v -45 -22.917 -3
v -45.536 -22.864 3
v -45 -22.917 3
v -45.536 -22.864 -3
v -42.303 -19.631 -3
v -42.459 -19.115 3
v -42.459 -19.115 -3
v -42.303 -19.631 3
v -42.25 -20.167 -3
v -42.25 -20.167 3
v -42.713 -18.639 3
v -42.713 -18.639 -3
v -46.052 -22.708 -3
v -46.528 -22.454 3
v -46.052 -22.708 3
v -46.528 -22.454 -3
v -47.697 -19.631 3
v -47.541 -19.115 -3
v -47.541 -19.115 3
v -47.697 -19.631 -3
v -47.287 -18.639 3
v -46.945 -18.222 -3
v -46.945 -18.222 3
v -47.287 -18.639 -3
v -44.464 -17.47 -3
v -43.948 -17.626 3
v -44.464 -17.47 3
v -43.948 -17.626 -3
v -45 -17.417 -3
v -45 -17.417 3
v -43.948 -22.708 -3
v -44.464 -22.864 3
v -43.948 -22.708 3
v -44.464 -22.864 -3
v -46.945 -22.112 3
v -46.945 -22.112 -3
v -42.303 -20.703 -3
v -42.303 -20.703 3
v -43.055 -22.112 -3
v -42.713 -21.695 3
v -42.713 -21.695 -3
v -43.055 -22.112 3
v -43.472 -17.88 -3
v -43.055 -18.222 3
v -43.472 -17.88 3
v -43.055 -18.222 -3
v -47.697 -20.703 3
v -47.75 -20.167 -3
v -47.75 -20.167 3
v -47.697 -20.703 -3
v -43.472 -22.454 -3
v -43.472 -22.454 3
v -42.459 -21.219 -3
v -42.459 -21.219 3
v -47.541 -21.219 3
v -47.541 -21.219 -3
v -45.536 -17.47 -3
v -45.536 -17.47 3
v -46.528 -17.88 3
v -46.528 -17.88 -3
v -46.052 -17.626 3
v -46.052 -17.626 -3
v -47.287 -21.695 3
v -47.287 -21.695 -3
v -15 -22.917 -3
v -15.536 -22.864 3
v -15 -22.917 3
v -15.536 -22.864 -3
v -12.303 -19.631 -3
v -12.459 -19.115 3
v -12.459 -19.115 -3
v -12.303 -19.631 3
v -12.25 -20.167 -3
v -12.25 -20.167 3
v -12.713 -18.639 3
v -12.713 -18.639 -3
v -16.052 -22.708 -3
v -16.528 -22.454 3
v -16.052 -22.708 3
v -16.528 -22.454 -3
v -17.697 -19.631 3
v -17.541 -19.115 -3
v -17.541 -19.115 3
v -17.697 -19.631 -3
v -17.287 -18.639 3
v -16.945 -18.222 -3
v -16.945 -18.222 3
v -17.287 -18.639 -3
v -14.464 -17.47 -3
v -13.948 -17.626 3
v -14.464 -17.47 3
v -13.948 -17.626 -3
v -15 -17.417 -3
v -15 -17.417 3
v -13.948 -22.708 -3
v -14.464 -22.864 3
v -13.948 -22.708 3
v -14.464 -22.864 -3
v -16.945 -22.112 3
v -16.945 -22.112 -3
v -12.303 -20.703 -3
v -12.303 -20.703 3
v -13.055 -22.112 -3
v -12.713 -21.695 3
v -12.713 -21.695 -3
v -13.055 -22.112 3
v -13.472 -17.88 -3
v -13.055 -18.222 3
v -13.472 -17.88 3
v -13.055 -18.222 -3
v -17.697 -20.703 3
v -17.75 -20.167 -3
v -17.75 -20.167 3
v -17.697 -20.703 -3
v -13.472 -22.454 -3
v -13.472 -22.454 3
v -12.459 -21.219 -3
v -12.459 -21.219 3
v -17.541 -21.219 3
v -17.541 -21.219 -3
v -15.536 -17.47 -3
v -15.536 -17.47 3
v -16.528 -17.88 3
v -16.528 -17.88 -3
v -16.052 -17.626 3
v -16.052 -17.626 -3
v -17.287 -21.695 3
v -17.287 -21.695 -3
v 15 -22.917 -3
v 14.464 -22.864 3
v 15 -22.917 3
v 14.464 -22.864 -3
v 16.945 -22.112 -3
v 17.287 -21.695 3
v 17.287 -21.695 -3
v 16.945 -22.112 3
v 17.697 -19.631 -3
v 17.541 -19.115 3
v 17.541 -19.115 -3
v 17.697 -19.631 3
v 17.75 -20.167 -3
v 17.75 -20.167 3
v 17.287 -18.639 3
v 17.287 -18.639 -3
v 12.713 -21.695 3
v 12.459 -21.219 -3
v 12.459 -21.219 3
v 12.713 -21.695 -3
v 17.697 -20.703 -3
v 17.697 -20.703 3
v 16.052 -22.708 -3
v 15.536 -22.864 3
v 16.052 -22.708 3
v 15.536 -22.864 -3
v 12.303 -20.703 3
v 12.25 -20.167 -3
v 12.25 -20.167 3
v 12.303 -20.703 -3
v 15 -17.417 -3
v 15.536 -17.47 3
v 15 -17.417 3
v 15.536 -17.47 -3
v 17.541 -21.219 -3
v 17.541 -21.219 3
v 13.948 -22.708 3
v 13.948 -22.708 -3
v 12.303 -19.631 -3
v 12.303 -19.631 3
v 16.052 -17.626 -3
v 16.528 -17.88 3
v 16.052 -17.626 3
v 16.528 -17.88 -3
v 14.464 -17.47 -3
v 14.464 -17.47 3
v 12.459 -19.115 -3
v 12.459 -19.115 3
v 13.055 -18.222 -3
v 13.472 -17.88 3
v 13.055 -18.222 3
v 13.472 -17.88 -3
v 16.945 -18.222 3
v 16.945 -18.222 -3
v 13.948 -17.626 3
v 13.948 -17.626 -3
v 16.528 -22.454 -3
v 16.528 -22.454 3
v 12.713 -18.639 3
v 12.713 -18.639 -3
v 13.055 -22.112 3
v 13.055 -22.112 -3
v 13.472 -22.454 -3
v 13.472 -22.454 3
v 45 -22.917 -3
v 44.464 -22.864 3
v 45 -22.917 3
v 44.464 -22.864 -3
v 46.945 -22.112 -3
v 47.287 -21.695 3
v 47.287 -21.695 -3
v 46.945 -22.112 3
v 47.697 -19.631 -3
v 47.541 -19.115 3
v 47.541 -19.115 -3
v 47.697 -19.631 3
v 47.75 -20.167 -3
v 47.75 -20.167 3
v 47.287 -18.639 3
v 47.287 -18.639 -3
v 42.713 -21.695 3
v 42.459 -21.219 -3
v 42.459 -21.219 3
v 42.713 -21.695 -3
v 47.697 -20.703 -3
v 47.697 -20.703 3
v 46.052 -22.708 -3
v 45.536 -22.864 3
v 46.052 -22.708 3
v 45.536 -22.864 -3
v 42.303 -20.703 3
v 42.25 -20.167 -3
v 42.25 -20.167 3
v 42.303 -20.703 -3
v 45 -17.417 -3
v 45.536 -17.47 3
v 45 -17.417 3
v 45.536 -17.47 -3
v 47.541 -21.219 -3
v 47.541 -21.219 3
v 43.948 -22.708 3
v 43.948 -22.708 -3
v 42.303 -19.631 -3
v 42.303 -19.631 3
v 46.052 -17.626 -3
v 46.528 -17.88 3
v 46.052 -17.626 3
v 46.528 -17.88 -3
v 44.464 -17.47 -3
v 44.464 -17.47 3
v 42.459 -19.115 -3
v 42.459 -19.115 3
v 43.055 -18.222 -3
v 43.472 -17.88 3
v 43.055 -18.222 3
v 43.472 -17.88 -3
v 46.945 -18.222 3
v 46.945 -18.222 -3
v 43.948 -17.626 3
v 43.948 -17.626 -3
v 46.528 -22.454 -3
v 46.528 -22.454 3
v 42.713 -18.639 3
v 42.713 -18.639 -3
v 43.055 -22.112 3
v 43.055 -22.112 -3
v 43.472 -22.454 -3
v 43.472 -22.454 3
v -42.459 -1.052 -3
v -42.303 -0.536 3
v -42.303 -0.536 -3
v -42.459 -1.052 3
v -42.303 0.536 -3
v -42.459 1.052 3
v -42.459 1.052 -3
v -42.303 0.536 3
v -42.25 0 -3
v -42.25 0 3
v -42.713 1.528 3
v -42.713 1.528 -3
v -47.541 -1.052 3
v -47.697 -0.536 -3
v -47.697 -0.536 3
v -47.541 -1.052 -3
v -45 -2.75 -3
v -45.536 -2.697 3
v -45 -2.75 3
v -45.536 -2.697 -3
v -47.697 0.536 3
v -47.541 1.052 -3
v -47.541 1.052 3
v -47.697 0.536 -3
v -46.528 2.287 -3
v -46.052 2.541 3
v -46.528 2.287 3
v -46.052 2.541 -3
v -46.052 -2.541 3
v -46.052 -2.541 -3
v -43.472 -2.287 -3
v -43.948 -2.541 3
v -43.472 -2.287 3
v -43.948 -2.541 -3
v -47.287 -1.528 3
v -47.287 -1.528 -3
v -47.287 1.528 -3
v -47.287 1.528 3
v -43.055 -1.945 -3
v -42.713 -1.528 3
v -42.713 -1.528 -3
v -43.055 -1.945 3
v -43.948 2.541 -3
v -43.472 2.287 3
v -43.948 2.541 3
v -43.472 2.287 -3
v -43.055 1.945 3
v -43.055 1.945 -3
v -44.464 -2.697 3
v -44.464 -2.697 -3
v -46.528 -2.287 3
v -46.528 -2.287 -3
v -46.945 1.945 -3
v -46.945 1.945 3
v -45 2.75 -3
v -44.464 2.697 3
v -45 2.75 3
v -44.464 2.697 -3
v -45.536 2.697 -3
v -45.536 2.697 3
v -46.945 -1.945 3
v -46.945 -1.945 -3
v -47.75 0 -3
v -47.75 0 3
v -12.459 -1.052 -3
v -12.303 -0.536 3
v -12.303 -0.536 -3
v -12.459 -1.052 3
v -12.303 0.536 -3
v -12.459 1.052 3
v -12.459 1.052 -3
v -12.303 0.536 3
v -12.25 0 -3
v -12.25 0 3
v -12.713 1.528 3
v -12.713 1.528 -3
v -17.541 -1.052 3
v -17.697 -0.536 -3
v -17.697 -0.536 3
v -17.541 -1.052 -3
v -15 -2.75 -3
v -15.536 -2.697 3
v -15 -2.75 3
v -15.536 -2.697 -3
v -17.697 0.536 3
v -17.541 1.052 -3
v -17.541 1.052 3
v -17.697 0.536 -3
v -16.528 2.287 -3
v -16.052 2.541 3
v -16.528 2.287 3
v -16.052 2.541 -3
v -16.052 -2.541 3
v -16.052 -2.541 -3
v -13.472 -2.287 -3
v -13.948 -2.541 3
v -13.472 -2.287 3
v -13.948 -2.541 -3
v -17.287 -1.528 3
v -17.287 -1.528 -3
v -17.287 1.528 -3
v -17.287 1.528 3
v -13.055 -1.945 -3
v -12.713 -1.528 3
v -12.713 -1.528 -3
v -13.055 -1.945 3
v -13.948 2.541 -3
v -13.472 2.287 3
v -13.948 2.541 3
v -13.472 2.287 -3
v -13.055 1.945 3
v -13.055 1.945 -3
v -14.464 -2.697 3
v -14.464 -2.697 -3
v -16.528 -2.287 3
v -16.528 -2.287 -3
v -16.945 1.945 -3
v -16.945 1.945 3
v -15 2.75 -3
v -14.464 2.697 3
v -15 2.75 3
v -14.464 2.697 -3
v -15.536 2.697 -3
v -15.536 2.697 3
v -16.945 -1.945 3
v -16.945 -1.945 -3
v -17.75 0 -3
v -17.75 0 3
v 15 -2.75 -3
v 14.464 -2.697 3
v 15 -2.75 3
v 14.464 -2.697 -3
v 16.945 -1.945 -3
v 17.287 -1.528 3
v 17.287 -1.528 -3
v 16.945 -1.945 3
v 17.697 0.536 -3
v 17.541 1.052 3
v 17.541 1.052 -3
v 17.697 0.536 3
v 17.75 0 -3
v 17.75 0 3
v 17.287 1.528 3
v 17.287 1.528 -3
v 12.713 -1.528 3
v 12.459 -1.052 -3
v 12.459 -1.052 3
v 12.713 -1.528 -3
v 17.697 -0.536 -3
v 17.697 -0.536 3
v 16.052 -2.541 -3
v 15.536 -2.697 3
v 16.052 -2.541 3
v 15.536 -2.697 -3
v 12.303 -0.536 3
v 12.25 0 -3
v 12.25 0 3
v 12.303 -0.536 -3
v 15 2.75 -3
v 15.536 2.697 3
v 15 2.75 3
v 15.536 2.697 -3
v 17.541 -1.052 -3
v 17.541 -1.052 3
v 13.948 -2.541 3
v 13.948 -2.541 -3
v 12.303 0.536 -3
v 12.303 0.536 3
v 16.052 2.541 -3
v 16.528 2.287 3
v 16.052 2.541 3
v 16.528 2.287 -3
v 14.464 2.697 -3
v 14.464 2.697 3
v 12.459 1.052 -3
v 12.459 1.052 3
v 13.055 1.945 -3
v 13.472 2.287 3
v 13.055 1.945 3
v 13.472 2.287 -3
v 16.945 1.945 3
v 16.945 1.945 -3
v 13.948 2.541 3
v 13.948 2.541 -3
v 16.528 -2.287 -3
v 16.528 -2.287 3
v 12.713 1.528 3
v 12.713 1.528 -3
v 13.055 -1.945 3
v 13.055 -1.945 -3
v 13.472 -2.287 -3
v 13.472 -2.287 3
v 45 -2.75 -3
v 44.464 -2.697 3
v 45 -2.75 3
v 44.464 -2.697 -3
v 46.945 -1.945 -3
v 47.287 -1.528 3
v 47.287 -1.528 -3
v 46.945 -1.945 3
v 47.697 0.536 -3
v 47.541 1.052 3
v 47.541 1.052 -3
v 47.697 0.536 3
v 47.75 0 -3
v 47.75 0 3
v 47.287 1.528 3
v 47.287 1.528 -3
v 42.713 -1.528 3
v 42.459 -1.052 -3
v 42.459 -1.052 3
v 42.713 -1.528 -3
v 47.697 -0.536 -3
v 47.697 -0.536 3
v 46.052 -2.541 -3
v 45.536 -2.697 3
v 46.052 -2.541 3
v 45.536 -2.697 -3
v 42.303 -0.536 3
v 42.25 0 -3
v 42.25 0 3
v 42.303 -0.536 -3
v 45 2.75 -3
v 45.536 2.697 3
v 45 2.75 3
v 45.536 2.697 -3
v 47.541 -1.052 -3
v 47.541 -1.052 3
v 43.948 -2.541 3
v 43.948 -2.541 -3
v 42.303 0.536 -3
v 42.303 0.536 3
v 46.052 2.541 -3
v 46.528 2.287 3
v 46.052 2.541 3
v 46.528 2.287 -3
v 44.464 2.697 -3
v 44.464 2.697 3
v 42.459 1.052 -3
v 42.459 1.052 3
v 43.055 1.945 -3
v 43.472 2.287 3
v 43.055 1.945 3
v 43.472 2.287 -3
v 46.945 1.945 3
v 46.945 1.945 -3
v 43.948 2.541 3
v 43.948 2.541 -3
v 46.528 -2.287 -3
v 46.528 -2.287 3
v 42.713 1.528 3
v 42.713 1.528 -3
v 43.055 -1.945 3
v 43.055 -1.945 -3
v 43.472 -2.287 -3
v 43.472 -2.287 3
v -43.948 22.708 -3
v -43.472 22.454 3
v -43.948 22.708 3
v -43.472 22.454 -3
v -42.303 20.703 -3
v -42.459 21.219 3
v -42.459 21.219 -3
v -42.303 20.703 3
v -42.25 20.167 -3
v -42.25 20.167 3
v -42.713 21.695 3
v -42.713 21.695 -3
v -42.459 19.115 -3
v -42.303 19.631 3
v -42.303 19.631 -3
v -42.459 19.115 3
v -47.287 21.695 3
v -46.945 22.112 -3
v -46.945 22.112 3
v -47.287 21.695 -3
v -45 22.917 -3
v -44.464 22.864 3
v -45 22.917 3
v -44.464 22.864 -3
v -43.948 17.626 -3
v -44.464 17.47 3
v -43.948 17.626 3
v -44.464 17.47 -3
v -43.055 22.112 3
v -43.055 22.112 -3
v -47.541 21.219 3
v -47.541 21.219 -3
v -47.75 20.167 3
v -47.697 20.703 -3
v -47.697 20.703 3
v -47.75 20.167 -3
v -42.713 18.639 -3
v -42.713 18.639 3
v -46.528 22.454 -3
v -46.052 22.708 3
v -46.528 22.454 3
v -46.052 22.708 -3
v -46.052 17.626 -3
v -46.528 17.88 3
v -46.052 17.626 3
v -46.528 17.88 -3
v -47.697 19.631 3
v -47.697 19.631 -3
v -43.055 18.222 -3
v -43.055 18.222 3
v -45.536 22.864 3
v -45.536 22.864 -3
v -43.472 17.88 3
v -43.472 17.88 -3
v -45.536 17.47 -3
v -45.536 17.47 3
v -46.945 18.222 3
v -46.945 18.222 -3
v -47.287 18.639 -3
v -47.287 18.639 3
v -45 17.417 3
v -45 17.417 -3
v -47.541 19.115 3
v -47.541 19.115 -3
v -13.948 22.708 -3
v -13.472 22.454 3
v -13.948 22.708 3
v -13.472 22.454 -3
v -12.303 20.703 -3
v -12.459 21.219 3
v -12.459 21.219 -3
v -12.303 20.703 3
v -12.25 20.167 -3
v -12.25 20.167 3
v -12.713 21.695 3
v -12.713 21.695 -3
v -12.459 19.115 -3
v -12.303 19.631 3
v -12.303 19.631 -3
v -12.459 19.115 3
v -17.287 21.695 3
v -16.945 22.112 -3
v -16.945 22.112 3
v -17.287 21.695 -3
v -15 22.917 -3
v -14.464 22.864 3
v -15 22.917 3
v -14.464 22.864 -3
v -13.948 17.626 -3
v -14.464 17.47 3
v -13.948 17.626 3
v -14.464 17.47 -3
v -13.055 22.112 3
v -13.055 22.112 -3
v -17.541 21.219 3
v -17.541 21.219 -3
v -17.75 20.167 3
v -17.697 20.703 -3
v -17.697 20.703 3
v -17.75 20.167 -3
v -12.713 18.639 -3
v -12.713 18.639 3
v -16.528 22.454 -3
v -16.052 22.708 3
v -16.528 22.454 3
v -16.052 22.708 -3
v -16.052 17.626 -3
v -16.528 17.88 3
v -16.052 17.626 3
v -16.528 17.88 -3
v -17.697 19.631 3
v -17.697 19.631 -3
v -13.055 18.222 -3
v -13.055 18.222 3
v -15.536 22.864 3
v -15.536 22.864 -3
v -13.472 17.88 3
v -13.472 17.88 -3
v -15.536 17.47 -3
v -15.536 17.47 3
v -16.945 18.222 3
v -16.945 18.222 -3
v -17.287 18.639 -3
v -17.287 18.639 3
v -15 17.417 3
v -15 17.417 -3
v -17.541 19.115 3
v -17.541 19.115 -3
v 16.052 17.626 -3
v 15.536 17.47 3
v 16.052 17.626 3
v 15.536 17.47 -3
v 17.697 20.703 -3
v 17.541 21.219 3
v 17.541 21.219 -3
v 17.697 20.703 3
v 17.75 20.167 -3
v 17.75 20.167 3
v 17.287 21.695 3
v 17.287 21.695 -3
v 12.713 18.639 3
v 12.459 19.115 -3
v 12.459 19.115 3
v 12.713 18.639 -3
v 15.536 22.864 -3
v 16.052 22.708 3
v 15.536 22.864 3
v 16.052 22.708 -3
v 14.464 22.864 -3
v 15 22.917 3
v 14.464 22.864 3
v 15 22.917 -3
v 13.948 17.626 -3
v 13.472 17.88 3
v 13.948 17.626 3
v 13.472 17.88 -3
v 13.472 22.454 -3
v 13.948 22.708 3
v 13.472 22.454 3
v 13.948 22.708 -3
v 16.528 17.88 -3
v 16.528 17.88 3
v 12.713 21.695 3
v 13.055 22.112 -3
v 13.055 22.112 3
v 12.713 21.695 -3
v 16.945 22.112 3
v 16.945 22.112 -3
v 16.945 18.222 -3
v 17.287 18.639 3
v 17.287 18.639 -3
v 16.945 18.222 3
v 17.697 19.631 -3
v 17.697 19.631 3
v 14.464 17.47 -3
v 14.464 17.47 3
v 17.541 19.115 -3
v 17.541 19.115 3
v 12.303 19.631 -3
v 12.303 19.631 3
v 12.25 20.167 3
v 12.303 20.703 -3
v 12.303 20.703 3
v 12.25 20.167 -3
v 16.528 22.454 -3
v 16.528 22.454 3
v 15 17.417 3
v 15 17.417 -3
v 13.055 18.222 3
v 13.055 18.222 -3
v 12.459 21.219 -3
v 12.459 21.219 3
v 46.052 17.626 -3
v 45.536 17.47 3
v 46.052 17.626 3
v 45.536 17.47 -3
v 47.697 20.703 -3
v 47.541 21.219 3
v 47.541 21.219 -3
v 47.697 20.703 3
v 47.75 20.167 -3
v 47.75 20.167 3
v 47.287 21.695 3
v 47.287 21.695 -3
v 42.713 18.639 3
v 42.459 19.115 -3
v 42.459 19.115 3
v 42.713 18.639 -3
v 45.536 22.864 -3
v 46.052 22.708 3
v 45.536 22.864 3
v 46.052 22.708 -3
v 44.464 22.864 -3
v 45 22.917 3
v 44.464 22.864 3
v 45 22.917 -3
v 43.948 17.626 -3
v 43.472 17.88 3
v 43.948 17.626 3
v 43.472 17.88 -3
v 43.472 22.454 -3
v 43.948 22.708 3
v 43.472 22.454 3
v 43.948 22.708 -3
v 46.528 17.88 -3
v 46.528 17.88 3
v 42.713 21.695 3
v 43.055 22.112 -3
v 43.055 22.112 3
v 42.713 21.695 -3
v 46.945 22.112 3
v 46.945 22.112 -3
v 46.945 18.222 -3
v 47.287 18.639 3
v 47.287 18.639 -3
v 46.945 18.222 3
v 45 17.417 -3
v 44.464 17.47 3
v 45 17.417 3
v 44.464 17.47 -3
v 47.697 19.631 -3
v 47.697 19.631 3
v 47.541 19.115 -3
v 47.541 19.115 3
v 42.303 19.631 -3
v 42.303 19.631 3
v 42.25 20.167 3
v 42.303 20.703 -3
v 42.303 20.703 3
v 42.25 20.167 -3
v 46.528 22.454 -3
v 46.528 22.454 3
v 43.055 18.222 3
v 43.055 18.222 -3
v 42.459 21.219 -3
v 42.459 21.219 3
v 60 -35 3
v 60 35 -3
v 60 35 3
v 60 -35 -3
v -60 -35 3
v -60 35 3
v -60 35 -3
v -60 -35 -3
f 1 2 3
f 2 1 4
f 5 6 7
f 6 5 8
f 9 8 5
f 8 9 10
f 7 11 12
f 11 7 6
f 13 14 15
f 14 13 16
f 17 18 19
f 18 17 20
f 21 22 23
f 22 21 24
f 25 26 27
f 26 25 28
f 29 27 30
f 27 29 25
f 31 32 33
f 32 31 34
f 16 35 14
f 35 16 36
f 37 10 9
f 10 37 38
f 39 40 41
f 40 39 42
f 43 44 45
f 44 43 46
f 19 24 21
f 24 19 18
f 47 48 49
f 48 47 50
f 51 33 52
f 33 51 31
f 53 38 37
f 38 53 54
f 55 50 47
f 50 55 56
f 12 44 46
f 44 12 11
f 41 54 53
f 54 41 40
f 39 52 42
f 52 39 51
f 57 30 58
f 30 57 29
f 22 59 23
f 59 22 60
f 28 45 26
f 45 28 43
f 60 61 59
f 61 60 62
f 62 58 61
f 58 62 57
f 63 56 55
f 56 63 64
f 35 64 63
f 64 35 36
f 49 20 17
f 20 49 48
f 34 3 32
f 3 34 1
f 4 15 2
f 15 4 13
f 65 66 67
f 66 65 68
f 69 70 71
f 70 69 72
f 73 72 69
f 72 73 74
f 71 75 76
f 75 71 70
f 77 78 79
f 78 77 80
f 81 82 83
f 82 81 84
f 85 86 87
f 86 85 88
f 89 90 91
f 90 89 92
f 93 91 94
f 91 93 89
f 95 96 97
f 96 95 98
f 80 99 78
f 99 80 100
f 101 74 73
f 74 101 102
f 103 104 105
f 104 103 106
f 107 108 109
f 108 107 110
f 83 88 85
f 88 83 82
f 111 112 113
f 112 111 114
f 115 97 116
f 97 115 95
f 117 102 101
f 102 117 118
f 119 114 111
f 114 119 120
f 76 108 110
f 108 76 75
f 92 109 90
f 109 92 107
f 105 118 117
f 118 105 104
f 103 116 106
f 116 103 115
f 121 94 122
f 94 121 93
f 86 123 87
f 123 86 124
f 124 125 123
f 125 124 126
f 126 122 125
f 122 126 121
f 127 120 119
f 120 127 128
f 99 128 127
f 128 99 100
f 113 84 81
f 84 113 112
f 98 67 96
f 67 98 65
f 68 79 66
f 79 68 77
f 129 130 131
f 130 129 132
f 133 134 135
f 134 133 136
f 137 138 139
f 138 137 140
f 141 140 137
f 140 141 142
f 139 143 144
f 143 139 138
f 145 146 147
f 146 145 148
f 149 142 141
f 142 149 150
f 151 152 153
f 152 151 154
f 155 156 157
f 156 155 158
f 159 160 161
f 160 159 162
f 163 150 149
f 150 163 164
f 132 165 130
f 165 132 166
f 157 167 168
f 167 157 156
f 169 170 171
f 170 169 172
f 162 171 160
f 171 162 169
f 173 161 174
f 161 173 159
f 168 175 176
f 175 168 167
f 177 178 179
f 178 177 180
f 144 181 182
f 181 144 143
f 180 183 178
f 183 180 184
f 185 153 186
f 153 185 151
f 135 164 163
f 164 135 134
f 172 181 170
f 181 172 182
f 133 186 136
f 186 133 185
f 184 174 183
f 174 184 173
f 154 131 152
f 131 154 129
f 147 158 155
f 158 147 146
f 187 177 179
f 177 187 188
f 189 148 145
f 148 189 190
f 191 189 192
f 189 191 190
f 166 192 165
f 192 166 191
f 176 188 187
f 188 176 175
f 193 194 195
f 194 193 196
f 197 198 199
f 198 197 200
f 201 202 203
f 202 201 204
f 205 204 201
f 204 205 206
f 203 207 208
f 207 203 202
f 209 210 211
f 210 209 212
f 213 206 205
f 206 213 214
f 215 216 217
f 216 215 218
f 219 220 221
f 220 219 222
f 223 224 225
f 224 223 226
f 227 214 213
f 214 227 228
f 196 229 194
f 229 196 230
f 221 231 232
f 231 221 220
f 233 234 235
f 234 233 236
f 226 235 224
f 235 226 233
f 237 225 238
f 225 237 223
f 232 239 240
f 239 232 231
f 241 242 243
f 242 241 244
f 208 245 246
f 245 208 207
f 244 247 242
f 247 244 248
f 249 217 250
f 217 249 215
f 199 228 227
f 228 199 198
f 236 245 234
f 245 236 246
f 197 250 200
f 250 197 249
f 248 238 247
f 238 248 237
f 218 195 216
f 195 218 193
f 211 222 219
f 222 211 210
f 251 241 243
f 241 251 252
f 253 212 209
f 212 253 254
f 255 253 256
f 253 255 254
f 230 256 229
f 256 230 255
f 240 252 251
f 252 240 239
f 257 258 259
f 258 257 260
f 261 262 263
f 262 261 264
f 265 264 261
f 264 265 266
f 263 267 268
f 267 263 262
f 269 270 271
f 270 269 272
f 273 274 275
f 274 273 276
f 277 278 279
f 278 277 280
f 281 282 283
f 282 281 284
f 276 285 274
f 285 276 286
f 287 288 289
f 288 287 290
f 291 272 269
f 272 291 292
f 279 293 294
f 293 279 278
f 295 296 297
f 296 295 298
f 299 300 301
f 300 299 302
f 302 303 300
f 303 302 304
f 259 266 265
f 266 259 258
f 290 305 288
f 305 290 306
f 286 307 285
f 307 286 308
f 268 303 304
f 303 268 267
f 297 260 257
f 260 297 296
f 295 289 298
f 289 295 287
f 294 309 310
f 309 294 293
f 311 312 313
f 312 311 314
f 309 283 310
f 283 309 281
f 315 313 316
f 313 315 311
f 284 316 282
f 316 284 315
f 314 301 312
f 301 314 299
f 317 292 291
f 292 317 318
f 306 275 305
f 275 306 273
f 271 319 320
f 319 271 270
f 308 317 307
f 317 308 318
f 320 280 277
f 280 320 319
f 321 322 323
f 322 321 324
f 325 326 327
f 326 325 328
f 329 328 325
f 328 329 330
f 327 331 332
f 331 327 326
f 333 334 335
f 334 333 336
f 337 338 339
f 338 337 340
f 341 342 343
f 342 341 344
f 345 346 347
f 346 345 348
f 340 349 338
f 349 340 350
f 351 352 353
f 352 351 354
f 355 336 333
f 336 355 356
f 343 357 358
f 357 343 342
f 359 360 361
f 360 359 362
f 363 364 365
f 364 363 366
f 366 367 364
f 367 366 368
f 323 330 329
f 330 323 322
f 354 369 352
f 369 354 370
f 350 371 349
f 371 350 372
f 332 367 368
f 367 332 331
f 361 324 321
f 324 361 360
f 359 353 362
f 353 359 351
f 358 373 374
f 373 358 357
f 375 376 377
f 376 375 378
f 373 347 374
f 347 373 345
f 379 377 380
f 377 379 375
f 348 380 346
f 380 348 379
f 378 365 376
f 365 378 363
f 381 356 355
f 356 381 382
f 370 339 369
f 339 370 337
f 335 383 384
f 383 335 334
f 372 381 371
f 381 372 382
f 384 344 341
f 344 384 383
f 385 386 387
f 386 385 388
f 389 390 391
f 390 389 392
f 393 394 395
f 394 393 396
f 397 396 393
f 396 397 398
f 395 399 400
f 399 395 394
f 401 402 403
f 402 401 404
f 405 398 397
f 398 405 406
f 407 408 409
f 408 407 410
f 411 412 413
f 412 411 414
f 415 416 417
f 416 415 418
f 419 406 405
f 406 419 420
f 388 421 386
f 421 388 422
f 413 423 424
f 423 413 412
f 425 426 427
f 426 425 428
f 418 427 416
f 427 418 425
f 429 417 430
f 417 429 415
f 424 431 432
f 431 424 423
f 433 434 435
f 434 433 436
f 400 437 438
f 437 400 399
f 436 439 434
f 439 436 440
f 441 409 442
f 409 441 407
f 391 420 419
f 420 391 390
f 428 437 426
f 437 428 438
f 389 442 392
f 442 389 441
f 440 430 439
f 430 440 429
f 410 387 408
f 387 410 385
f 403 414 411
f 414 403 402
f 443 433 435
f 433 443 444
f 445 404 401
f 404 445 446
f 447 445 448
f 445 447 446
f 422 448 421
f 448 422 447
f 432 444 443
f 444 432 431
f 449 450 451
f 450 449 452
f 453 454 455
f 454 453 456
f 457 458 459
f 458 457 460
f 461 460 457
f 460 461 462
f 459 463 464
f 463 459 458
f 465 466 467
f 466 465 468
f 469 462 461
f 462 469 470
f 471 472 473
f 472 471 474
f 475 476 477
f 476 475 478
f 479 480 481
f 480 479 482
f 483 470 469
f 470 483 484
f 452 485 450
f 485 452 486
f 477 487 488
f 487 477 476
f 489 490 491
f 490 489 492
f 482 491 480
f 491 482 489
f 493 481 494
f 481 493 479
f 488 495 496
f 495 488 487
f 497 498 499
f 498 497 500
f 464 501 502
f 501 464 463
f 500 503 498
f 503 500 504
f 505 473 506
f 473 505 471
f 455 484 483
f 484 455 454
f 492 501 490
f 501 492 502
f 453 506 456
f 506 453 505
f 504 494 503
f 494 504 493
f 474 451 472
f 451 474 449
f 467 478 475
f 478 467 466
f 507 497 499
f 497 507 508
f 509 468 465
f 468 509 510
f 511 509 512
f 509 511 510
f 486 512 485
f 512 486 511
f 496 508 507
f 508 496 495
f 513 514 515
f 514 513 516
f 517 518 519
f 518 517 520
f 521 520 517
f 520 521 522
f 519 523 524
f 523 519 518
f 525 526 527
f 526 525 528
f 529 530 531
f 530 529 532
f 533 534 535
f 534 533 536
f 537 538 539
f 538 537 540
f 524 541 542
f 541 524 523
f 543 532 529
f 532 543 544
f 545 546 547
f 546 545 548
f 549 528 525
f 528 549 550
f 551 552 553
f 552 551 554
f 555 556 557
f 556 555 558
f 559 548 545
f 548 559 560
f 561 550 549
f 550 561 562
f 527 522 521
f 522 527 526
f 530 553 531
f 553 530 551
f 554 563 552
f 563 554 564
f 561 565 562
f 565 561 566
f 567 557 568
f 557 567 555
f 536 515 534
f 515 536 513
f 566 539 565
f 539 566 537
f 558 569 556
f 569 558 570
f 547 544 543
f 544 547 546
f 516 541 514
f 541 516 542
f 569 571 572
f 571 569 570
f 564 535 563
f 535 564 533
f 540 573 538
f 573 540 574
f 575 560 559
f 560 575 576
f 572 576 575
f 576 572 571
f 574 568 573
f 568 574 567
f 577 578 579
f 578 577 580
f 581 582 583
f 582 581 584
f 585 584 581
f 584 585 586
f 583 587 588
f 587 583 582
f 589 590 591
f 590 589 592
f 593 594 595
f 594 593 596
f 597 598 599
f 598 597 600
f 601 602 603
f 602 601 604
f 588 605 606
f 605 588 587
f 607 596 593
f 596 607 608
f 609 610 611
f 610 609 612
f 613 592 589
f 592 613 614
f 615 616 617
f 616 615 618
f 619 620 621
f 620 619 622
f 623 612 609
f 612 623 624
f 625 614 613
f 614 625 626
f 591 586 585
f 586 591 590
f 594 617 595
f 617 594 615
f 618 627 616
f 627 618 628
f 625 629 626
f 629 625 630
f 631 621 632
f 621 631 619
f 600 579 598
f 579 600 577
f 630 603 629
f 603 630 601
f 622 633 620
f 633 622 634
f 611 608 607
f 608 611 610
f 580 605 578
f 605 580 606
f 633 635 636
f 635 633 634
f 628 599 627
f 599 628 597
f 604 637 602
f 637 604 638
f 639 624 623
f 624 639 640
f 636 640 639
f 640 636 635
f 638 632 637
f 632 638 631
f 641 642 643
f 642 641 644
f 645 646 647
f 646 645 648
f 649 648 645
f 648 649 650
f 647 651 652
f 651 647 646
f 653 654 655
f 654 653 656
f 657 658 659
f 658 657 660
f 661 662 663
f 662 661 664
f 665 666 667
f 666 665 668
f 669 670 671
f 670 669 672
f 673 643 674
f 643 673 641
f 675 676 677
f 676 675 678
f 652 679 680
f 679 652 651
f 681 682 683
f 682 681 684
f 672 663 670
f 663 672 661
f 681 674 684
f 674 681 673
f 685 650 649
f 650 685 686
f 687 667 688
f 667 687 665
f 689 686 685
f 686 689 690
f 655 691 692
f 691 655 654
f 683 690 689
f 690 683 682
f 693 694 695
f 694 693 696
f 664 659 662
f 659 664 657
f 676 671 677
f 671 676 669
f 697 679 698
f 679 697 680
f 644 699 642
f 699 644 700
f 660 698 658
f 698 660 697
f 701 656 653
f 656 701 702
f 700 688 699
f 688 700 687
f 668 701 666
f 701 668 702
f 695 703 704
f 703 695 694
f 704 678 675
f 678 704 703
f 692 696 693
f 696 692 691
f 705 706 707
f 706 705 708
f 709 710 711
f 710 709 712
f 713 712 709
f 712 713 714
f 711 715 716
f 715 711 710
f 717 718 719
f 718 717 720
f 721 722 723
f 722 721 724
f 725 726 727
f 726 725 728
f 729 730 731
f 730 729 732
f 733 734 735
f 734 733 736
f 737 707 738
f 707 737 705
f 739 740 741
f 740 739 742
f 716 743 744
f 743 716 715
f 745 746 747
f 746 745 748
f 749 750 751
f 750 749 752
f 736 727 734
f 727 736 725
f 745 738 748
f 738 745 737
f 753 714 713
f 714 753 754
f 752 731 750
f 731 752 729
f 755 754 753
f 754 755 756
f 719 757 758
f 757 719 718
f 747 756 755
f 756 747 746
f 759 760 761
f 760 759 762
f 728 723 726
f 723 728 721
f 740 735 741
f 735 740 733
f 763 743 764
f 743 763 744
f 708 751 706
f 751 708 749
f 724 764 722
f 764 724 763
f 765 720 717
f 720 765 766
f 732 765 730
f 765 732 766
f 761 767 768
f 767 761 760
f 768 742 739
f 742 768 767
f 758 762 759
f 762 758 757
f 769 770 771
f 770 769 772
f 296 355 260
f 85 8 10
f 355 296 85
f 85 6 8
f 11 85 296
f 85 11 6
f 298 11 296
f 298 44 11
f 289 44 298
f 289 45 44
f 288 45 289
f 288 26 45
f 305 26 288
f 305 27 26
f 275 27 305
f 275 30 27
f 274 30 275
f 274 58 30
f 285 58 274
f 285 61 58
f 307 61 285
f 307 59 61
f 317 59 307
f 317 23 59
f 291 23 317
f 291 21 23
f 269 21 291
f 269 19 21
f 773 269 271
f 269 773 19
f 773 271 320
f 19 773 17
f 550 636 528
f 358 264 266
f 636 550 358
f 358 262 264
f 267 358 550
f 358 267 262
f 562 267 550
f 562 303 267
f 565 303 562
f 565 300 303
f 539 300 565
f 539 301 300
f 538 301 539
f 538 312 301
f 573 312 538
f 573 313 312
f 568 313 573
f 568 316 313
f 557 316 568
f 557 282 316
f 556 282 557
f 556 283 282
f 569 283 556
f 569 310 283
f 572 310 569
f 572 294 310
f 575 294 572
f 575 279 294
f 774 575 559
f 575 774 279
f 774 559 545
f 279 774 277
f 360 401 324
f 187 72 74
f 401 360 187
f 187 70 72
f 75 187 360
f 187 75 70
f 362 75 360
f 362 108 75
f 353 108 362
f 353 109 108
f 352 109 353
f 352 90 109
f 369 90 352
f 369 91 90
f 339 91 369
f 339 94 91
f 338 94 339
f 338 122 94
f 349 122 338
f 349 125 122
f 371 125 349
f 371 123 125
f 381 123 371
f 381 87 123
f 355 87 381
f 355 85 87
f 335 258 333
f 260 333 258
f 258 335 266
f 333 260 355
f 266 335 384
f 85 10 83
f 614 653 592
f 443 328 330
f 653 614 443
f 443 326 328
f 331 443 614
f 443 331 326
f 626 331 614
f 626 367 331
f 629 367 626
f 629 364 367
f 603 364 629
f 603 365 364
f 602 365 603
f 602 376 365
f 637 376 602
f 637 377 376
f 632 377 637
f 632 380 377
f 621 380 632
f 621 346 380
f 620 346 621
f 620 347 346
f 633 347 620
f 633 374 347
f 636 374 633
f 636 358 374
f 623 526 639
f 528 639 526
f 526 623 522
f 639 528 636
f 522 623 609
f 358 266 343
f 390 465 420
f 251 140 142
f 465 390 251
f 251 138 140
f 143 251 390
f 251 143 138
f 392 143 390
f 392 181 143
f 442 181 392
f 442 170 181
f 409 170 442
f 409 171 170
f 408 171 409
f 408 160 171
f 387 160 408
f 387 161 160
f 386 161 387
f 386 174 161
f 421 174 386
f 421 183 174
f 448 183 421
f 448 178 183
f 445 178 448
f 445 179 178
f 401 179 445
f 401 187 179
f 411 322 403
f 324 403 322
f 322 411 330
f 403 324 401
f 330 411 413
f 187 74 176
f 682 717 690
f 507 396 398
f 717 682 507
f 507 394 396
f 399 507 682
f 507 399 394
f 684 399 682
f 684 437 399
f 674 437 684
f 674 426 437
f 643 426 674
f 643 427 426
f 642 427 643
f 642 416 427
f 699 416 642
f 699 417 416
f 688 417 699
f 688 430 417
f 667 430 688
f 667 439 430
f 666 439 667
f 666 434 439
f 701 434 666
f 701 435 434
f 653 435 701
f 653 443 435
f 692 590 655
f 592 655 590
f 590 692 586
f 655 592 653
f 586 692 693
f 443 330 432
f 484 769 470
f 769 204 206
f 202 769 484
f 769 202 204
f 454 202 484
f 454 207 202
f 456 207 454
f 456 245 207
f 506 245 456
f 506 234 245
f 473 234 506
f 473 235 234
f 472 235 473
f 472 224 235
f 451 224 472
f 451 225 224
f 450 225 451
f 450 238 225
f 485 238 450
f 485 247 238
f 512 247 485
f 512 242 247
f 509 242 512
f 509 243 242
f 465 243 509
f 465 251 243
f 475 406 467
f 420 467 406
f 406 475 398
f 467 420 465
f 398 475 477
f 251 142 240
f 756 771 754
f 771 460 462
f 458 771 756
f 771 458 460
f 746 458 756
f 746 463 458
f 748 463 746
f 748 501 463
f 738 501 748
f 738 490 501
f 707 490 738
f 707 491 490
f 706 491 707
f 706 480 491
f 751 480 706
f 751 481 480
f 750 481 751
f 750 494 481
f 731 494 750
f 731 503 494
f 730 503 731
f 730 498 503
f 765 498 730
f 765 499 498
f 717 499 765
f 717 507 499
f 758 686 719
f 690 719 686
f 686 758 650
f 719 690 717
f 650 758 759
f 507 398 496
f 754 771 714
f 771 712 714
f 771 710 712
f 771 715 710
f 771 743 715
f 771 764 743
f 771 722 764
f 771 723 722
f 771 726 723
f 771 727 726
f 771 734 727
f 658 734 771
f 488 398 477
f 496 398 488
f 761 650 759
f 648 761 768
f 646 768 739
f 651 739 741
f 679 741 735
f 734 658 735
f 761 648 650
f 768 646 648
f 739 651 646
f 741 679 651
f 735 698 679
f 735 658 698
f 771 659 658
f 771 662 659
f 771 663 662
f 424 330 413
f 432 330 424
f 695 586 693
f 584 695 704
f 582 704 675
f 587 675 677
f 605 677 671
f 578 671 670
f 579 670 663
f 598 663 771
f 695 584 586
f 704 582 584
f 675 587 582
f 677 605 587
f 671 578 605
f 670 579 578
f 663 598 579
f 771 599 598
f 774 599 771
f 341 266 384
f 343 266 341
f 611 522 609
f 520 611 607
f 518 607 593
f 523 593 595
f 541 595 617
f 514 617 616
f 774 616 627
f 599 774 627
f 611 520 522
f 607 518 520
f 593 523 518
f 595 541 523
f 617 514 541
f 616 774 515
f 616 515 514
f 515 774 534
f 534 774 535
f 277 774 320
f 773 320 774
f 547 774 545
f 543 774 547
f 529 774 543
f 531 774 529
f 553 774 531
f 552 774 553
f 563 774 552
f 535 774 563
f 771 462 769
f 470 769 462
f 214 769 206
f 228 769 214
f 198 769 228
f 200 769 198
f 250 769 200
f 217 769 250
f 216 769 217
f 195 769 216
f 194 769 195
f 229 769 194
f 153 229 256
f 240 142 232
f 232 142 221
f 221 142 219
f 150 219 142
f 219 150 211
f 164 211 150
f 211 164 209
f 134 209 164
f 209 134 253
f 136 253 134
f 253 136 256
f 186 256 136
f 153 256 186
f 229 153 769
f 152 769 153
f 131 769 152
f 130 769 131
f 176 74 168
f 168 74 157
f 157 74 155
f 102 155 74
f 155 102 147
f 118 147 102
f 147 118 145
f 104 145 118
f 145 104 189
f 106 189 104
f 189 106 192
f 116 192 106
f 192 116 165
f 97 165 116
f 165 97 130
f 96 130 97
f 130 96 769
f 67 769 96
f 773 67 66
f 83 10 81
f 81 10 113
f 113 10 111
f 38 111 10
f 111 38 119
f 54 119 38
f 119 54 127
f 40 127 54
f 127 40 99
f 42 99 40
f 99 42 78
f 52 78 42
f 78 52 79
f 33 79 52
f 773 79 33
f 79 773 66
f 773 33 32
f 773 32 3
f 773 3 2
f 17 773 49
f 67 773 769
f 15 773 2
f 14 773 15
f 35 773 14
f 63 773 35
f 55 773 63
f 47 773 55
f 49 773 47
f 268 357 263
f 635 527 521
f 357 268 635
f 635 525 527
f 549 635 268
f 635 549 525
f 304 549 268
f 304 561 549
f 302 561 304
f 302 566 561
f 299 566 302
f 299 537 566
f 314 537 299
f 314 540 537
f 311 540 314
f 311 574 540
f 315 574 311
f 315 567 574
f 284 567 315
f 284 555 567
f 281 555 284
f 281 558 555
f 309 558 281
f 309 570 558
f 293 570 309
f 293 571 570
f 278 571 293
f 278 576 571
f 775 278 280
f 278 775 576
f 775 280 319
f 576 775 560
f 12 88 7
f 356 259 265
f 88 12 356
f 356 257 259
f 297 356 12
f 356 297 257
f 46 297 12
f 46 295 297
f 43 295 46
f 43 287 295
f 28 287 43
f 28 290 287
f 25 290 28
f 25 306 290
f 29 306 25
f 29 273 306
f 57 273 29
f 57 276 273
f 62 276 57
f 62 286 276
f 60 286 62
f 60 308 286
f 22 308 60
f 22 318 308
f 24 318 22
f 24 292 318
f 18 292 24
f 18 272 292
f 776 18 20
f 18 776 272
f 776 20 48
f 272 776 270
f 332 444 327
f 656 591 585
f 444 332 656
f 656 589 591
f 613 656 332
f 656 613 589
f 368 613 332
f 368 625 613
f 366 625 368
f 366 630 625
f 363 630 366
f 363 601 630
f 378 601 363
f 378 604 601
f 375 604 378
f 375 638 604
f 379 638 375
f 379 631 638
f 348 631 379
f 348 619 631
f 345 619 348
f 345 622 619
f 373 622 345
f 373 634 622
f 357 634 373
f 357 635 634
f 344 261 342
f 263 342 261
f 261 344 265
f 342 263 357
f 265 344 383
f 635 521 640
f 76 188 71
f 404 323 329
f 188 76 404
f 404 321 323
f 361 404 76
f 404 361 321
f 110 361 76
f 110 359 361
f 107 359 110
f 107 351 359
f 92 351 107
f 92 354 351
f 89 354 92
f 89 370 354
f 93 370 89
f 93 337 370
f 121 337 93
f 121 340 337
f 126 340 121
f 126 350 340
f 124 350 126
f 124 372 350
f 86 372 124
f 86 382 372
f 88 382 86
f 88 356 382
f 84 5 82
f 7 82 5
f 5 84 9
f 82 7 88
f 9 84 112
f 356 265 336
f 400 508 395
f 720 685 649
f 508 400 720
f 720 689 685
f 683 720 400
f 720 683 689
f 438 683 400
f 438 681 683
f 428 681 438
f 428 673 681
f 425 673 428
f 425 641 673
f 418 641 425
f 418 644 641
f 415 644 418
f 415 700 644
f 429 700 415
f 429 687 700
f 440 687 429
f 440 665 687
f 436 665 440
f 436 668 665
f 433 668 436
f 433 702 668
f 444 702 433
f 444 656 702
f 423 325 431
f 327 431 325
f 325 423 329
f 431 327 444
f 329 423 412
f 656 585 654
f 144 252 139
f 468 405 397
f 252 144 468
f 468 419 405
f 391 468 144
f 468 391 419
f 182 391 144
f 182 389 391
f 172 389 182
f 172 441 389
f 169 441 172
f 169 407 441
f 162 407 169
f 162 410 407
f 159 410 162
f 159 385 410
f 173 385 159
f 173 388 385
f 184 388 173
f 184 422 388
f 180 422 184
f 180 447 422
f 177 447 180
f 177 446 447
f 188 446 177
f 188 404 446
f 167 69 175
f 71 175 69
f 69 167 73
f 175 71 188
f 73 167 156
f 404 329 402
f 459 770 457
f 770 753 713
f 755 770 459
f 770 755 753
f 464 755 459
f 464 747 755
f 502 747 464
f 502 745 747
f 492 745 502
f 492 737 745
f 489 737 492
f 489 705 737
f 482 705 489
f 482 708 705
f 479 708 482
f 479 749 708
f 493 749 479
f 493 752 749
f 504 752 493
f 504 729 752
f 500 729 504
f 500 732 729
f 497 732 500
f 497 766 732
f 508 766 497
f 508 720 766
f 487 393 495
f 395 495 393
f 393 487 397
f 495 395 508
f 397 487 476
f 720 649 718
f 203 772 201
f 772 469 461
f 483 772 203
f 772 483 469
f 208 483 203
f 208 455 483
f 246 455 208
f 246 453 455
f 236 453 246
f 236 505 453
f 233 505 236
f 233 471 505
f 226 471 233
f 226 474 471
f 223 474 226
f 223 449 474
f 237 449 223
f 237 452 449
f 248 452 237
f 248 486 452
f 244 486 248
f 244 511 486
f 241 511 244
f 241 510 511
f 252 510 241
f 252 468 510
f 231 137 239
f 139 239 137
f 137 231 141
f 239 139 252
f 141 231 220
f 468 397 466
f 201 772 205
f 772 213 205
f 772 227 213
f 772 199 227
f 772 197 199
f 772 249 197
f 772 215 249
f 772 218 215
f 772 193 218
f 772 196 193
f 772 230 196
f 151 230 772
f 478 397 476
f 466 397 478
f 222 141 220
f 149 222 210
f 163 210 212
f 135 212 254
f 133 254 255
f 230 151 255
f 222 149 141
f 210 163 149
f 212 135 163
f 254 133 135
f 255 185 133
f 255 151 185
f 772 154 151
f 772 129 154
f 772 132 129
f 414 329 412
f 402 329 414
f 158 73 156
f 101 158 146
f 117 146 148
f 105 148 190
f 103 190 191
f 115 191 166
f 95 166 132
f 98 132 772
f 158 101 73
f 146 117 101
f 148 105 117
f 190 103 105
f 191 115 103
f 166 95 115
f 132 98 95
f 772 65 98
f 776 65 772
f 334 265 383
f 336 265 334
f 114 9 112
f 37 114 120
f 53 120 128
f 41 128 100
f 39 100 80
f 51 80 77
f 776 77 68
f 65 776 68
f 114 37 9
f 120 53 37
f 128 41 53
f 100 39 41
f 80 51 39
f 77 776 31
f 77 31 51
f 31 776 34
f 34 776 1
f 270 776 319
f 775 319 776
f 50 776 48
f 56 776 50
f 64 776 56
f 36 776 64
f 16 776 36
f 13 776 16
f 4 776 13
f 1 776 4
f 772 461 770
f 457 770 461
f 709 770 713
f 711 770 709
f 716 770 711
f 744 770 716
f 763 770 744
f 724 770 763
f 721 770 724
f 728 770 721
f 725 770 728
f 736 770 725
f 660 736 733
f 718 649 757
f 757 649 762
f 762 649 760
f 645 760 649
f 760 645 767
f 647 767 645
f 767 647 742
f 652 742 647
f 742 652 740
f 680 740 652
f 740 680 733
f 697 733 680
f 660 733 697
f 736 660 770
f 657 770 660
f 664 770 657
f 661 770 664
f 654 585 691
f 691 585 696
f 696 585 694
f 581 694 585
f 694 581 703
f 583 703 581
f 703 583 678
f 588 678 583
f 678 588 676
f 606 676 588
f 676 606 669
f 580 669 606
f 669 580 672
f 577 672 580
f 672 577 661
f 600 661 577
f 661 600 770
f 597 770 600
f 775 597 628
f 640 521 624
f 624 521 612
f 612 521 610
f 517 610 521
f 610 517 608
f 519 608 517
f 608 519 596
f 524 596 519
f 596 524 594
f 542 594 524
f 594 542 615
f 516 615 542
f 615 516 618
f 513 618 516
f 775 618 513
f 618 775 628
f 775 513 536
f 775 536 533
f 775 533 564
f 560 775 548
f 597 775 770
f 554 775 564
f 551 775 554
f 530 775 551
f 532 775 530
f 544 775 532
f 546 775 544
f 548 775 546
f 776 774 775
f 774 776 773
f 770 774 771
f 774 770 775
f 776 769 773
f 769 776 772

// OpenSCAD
$fn = 32;

// ----------------------------------------------------------------------
// Perforated panel 120 x 70 x 6
// 3 x 4 Ø5.5 holes, grid layout
// ----------------------------------------------------------------------

// --- parameters (mm) ---
panel = [120, 70, 6];  // overall size (x, y, z)
hole_d = 5.5;          // hole diameter
pitch_x = 30;          // hole pitch along X
pitch_y = 20.167;      // hole pitch along Y

// --- derived feature positions (mm) ---
margin = hole_d / 2 + 2;            // = 4.75   clearance from the panel edge
cols = floor((panel[0] - 2 * margin) / pitch_x) + 1;  // = 4   how many columns fit in X
rows = floor((panel[1] - 2 * margin) / pitch_y) + 1;  // = 3   how many rows fit in Y
span_x = (cols - 1) * pitch_x + 0;  // = 90   width of the field
span_y = (rows - 1) * pitch_y;      // = 40.33   height of the field
origin_x = -span_x / 2;             // = -45   X of the first hole
origin_y = -span_y / 2;             // = -20.17   Y of the first row
holes = rows * cols;                // = 12   holes in total
feature_centers = [
  [origin_x + 0 * pitch_x, origin_y + 0 * pitch_y],
  [origin_x + 1 * pitch_x, origin_y + 0 * pitch_y],
  [origin_x + 2 * pitch_x, origin_y + 0 * pitch_y],
  [origin_x + 3 * pitch_x, origin_y + 0 * pitch_y],
  [origin_x + 0 * pitch_x, origin_y + 1 * pitch_y],
  [origin_x + 1 * pitch_x, origin_y + 1 * pitch_y],
  [origin_x + 2 * pitch_x, origin_y + 1 * pitch_y],
  [origin_x + 3 * pitch_x, origin_y + 1 * pitch_y],
  [origin_x + 0 * pitch_x, origin_y + 2 * pitch_y],
  [origin_x + 1 * pitch_x, origin_y + 2 * pitch_y],
  [origin_x + 2 * pitch_x, origin_y + 2 * pitch_y],
  [origin_x + 3 * pitch_x, origin_y + 2 * pitch_y]
];   // hole centres, used verbatim by the cutter loop

// panel outline, every hole through
difference() {
  cube(panel, center = true);
  for (centre = feature_centers)
    translate([centre[0], centre[1], 0])
      cylinder(d = hole_d, h = panel[2] + 2, center = true);
}
